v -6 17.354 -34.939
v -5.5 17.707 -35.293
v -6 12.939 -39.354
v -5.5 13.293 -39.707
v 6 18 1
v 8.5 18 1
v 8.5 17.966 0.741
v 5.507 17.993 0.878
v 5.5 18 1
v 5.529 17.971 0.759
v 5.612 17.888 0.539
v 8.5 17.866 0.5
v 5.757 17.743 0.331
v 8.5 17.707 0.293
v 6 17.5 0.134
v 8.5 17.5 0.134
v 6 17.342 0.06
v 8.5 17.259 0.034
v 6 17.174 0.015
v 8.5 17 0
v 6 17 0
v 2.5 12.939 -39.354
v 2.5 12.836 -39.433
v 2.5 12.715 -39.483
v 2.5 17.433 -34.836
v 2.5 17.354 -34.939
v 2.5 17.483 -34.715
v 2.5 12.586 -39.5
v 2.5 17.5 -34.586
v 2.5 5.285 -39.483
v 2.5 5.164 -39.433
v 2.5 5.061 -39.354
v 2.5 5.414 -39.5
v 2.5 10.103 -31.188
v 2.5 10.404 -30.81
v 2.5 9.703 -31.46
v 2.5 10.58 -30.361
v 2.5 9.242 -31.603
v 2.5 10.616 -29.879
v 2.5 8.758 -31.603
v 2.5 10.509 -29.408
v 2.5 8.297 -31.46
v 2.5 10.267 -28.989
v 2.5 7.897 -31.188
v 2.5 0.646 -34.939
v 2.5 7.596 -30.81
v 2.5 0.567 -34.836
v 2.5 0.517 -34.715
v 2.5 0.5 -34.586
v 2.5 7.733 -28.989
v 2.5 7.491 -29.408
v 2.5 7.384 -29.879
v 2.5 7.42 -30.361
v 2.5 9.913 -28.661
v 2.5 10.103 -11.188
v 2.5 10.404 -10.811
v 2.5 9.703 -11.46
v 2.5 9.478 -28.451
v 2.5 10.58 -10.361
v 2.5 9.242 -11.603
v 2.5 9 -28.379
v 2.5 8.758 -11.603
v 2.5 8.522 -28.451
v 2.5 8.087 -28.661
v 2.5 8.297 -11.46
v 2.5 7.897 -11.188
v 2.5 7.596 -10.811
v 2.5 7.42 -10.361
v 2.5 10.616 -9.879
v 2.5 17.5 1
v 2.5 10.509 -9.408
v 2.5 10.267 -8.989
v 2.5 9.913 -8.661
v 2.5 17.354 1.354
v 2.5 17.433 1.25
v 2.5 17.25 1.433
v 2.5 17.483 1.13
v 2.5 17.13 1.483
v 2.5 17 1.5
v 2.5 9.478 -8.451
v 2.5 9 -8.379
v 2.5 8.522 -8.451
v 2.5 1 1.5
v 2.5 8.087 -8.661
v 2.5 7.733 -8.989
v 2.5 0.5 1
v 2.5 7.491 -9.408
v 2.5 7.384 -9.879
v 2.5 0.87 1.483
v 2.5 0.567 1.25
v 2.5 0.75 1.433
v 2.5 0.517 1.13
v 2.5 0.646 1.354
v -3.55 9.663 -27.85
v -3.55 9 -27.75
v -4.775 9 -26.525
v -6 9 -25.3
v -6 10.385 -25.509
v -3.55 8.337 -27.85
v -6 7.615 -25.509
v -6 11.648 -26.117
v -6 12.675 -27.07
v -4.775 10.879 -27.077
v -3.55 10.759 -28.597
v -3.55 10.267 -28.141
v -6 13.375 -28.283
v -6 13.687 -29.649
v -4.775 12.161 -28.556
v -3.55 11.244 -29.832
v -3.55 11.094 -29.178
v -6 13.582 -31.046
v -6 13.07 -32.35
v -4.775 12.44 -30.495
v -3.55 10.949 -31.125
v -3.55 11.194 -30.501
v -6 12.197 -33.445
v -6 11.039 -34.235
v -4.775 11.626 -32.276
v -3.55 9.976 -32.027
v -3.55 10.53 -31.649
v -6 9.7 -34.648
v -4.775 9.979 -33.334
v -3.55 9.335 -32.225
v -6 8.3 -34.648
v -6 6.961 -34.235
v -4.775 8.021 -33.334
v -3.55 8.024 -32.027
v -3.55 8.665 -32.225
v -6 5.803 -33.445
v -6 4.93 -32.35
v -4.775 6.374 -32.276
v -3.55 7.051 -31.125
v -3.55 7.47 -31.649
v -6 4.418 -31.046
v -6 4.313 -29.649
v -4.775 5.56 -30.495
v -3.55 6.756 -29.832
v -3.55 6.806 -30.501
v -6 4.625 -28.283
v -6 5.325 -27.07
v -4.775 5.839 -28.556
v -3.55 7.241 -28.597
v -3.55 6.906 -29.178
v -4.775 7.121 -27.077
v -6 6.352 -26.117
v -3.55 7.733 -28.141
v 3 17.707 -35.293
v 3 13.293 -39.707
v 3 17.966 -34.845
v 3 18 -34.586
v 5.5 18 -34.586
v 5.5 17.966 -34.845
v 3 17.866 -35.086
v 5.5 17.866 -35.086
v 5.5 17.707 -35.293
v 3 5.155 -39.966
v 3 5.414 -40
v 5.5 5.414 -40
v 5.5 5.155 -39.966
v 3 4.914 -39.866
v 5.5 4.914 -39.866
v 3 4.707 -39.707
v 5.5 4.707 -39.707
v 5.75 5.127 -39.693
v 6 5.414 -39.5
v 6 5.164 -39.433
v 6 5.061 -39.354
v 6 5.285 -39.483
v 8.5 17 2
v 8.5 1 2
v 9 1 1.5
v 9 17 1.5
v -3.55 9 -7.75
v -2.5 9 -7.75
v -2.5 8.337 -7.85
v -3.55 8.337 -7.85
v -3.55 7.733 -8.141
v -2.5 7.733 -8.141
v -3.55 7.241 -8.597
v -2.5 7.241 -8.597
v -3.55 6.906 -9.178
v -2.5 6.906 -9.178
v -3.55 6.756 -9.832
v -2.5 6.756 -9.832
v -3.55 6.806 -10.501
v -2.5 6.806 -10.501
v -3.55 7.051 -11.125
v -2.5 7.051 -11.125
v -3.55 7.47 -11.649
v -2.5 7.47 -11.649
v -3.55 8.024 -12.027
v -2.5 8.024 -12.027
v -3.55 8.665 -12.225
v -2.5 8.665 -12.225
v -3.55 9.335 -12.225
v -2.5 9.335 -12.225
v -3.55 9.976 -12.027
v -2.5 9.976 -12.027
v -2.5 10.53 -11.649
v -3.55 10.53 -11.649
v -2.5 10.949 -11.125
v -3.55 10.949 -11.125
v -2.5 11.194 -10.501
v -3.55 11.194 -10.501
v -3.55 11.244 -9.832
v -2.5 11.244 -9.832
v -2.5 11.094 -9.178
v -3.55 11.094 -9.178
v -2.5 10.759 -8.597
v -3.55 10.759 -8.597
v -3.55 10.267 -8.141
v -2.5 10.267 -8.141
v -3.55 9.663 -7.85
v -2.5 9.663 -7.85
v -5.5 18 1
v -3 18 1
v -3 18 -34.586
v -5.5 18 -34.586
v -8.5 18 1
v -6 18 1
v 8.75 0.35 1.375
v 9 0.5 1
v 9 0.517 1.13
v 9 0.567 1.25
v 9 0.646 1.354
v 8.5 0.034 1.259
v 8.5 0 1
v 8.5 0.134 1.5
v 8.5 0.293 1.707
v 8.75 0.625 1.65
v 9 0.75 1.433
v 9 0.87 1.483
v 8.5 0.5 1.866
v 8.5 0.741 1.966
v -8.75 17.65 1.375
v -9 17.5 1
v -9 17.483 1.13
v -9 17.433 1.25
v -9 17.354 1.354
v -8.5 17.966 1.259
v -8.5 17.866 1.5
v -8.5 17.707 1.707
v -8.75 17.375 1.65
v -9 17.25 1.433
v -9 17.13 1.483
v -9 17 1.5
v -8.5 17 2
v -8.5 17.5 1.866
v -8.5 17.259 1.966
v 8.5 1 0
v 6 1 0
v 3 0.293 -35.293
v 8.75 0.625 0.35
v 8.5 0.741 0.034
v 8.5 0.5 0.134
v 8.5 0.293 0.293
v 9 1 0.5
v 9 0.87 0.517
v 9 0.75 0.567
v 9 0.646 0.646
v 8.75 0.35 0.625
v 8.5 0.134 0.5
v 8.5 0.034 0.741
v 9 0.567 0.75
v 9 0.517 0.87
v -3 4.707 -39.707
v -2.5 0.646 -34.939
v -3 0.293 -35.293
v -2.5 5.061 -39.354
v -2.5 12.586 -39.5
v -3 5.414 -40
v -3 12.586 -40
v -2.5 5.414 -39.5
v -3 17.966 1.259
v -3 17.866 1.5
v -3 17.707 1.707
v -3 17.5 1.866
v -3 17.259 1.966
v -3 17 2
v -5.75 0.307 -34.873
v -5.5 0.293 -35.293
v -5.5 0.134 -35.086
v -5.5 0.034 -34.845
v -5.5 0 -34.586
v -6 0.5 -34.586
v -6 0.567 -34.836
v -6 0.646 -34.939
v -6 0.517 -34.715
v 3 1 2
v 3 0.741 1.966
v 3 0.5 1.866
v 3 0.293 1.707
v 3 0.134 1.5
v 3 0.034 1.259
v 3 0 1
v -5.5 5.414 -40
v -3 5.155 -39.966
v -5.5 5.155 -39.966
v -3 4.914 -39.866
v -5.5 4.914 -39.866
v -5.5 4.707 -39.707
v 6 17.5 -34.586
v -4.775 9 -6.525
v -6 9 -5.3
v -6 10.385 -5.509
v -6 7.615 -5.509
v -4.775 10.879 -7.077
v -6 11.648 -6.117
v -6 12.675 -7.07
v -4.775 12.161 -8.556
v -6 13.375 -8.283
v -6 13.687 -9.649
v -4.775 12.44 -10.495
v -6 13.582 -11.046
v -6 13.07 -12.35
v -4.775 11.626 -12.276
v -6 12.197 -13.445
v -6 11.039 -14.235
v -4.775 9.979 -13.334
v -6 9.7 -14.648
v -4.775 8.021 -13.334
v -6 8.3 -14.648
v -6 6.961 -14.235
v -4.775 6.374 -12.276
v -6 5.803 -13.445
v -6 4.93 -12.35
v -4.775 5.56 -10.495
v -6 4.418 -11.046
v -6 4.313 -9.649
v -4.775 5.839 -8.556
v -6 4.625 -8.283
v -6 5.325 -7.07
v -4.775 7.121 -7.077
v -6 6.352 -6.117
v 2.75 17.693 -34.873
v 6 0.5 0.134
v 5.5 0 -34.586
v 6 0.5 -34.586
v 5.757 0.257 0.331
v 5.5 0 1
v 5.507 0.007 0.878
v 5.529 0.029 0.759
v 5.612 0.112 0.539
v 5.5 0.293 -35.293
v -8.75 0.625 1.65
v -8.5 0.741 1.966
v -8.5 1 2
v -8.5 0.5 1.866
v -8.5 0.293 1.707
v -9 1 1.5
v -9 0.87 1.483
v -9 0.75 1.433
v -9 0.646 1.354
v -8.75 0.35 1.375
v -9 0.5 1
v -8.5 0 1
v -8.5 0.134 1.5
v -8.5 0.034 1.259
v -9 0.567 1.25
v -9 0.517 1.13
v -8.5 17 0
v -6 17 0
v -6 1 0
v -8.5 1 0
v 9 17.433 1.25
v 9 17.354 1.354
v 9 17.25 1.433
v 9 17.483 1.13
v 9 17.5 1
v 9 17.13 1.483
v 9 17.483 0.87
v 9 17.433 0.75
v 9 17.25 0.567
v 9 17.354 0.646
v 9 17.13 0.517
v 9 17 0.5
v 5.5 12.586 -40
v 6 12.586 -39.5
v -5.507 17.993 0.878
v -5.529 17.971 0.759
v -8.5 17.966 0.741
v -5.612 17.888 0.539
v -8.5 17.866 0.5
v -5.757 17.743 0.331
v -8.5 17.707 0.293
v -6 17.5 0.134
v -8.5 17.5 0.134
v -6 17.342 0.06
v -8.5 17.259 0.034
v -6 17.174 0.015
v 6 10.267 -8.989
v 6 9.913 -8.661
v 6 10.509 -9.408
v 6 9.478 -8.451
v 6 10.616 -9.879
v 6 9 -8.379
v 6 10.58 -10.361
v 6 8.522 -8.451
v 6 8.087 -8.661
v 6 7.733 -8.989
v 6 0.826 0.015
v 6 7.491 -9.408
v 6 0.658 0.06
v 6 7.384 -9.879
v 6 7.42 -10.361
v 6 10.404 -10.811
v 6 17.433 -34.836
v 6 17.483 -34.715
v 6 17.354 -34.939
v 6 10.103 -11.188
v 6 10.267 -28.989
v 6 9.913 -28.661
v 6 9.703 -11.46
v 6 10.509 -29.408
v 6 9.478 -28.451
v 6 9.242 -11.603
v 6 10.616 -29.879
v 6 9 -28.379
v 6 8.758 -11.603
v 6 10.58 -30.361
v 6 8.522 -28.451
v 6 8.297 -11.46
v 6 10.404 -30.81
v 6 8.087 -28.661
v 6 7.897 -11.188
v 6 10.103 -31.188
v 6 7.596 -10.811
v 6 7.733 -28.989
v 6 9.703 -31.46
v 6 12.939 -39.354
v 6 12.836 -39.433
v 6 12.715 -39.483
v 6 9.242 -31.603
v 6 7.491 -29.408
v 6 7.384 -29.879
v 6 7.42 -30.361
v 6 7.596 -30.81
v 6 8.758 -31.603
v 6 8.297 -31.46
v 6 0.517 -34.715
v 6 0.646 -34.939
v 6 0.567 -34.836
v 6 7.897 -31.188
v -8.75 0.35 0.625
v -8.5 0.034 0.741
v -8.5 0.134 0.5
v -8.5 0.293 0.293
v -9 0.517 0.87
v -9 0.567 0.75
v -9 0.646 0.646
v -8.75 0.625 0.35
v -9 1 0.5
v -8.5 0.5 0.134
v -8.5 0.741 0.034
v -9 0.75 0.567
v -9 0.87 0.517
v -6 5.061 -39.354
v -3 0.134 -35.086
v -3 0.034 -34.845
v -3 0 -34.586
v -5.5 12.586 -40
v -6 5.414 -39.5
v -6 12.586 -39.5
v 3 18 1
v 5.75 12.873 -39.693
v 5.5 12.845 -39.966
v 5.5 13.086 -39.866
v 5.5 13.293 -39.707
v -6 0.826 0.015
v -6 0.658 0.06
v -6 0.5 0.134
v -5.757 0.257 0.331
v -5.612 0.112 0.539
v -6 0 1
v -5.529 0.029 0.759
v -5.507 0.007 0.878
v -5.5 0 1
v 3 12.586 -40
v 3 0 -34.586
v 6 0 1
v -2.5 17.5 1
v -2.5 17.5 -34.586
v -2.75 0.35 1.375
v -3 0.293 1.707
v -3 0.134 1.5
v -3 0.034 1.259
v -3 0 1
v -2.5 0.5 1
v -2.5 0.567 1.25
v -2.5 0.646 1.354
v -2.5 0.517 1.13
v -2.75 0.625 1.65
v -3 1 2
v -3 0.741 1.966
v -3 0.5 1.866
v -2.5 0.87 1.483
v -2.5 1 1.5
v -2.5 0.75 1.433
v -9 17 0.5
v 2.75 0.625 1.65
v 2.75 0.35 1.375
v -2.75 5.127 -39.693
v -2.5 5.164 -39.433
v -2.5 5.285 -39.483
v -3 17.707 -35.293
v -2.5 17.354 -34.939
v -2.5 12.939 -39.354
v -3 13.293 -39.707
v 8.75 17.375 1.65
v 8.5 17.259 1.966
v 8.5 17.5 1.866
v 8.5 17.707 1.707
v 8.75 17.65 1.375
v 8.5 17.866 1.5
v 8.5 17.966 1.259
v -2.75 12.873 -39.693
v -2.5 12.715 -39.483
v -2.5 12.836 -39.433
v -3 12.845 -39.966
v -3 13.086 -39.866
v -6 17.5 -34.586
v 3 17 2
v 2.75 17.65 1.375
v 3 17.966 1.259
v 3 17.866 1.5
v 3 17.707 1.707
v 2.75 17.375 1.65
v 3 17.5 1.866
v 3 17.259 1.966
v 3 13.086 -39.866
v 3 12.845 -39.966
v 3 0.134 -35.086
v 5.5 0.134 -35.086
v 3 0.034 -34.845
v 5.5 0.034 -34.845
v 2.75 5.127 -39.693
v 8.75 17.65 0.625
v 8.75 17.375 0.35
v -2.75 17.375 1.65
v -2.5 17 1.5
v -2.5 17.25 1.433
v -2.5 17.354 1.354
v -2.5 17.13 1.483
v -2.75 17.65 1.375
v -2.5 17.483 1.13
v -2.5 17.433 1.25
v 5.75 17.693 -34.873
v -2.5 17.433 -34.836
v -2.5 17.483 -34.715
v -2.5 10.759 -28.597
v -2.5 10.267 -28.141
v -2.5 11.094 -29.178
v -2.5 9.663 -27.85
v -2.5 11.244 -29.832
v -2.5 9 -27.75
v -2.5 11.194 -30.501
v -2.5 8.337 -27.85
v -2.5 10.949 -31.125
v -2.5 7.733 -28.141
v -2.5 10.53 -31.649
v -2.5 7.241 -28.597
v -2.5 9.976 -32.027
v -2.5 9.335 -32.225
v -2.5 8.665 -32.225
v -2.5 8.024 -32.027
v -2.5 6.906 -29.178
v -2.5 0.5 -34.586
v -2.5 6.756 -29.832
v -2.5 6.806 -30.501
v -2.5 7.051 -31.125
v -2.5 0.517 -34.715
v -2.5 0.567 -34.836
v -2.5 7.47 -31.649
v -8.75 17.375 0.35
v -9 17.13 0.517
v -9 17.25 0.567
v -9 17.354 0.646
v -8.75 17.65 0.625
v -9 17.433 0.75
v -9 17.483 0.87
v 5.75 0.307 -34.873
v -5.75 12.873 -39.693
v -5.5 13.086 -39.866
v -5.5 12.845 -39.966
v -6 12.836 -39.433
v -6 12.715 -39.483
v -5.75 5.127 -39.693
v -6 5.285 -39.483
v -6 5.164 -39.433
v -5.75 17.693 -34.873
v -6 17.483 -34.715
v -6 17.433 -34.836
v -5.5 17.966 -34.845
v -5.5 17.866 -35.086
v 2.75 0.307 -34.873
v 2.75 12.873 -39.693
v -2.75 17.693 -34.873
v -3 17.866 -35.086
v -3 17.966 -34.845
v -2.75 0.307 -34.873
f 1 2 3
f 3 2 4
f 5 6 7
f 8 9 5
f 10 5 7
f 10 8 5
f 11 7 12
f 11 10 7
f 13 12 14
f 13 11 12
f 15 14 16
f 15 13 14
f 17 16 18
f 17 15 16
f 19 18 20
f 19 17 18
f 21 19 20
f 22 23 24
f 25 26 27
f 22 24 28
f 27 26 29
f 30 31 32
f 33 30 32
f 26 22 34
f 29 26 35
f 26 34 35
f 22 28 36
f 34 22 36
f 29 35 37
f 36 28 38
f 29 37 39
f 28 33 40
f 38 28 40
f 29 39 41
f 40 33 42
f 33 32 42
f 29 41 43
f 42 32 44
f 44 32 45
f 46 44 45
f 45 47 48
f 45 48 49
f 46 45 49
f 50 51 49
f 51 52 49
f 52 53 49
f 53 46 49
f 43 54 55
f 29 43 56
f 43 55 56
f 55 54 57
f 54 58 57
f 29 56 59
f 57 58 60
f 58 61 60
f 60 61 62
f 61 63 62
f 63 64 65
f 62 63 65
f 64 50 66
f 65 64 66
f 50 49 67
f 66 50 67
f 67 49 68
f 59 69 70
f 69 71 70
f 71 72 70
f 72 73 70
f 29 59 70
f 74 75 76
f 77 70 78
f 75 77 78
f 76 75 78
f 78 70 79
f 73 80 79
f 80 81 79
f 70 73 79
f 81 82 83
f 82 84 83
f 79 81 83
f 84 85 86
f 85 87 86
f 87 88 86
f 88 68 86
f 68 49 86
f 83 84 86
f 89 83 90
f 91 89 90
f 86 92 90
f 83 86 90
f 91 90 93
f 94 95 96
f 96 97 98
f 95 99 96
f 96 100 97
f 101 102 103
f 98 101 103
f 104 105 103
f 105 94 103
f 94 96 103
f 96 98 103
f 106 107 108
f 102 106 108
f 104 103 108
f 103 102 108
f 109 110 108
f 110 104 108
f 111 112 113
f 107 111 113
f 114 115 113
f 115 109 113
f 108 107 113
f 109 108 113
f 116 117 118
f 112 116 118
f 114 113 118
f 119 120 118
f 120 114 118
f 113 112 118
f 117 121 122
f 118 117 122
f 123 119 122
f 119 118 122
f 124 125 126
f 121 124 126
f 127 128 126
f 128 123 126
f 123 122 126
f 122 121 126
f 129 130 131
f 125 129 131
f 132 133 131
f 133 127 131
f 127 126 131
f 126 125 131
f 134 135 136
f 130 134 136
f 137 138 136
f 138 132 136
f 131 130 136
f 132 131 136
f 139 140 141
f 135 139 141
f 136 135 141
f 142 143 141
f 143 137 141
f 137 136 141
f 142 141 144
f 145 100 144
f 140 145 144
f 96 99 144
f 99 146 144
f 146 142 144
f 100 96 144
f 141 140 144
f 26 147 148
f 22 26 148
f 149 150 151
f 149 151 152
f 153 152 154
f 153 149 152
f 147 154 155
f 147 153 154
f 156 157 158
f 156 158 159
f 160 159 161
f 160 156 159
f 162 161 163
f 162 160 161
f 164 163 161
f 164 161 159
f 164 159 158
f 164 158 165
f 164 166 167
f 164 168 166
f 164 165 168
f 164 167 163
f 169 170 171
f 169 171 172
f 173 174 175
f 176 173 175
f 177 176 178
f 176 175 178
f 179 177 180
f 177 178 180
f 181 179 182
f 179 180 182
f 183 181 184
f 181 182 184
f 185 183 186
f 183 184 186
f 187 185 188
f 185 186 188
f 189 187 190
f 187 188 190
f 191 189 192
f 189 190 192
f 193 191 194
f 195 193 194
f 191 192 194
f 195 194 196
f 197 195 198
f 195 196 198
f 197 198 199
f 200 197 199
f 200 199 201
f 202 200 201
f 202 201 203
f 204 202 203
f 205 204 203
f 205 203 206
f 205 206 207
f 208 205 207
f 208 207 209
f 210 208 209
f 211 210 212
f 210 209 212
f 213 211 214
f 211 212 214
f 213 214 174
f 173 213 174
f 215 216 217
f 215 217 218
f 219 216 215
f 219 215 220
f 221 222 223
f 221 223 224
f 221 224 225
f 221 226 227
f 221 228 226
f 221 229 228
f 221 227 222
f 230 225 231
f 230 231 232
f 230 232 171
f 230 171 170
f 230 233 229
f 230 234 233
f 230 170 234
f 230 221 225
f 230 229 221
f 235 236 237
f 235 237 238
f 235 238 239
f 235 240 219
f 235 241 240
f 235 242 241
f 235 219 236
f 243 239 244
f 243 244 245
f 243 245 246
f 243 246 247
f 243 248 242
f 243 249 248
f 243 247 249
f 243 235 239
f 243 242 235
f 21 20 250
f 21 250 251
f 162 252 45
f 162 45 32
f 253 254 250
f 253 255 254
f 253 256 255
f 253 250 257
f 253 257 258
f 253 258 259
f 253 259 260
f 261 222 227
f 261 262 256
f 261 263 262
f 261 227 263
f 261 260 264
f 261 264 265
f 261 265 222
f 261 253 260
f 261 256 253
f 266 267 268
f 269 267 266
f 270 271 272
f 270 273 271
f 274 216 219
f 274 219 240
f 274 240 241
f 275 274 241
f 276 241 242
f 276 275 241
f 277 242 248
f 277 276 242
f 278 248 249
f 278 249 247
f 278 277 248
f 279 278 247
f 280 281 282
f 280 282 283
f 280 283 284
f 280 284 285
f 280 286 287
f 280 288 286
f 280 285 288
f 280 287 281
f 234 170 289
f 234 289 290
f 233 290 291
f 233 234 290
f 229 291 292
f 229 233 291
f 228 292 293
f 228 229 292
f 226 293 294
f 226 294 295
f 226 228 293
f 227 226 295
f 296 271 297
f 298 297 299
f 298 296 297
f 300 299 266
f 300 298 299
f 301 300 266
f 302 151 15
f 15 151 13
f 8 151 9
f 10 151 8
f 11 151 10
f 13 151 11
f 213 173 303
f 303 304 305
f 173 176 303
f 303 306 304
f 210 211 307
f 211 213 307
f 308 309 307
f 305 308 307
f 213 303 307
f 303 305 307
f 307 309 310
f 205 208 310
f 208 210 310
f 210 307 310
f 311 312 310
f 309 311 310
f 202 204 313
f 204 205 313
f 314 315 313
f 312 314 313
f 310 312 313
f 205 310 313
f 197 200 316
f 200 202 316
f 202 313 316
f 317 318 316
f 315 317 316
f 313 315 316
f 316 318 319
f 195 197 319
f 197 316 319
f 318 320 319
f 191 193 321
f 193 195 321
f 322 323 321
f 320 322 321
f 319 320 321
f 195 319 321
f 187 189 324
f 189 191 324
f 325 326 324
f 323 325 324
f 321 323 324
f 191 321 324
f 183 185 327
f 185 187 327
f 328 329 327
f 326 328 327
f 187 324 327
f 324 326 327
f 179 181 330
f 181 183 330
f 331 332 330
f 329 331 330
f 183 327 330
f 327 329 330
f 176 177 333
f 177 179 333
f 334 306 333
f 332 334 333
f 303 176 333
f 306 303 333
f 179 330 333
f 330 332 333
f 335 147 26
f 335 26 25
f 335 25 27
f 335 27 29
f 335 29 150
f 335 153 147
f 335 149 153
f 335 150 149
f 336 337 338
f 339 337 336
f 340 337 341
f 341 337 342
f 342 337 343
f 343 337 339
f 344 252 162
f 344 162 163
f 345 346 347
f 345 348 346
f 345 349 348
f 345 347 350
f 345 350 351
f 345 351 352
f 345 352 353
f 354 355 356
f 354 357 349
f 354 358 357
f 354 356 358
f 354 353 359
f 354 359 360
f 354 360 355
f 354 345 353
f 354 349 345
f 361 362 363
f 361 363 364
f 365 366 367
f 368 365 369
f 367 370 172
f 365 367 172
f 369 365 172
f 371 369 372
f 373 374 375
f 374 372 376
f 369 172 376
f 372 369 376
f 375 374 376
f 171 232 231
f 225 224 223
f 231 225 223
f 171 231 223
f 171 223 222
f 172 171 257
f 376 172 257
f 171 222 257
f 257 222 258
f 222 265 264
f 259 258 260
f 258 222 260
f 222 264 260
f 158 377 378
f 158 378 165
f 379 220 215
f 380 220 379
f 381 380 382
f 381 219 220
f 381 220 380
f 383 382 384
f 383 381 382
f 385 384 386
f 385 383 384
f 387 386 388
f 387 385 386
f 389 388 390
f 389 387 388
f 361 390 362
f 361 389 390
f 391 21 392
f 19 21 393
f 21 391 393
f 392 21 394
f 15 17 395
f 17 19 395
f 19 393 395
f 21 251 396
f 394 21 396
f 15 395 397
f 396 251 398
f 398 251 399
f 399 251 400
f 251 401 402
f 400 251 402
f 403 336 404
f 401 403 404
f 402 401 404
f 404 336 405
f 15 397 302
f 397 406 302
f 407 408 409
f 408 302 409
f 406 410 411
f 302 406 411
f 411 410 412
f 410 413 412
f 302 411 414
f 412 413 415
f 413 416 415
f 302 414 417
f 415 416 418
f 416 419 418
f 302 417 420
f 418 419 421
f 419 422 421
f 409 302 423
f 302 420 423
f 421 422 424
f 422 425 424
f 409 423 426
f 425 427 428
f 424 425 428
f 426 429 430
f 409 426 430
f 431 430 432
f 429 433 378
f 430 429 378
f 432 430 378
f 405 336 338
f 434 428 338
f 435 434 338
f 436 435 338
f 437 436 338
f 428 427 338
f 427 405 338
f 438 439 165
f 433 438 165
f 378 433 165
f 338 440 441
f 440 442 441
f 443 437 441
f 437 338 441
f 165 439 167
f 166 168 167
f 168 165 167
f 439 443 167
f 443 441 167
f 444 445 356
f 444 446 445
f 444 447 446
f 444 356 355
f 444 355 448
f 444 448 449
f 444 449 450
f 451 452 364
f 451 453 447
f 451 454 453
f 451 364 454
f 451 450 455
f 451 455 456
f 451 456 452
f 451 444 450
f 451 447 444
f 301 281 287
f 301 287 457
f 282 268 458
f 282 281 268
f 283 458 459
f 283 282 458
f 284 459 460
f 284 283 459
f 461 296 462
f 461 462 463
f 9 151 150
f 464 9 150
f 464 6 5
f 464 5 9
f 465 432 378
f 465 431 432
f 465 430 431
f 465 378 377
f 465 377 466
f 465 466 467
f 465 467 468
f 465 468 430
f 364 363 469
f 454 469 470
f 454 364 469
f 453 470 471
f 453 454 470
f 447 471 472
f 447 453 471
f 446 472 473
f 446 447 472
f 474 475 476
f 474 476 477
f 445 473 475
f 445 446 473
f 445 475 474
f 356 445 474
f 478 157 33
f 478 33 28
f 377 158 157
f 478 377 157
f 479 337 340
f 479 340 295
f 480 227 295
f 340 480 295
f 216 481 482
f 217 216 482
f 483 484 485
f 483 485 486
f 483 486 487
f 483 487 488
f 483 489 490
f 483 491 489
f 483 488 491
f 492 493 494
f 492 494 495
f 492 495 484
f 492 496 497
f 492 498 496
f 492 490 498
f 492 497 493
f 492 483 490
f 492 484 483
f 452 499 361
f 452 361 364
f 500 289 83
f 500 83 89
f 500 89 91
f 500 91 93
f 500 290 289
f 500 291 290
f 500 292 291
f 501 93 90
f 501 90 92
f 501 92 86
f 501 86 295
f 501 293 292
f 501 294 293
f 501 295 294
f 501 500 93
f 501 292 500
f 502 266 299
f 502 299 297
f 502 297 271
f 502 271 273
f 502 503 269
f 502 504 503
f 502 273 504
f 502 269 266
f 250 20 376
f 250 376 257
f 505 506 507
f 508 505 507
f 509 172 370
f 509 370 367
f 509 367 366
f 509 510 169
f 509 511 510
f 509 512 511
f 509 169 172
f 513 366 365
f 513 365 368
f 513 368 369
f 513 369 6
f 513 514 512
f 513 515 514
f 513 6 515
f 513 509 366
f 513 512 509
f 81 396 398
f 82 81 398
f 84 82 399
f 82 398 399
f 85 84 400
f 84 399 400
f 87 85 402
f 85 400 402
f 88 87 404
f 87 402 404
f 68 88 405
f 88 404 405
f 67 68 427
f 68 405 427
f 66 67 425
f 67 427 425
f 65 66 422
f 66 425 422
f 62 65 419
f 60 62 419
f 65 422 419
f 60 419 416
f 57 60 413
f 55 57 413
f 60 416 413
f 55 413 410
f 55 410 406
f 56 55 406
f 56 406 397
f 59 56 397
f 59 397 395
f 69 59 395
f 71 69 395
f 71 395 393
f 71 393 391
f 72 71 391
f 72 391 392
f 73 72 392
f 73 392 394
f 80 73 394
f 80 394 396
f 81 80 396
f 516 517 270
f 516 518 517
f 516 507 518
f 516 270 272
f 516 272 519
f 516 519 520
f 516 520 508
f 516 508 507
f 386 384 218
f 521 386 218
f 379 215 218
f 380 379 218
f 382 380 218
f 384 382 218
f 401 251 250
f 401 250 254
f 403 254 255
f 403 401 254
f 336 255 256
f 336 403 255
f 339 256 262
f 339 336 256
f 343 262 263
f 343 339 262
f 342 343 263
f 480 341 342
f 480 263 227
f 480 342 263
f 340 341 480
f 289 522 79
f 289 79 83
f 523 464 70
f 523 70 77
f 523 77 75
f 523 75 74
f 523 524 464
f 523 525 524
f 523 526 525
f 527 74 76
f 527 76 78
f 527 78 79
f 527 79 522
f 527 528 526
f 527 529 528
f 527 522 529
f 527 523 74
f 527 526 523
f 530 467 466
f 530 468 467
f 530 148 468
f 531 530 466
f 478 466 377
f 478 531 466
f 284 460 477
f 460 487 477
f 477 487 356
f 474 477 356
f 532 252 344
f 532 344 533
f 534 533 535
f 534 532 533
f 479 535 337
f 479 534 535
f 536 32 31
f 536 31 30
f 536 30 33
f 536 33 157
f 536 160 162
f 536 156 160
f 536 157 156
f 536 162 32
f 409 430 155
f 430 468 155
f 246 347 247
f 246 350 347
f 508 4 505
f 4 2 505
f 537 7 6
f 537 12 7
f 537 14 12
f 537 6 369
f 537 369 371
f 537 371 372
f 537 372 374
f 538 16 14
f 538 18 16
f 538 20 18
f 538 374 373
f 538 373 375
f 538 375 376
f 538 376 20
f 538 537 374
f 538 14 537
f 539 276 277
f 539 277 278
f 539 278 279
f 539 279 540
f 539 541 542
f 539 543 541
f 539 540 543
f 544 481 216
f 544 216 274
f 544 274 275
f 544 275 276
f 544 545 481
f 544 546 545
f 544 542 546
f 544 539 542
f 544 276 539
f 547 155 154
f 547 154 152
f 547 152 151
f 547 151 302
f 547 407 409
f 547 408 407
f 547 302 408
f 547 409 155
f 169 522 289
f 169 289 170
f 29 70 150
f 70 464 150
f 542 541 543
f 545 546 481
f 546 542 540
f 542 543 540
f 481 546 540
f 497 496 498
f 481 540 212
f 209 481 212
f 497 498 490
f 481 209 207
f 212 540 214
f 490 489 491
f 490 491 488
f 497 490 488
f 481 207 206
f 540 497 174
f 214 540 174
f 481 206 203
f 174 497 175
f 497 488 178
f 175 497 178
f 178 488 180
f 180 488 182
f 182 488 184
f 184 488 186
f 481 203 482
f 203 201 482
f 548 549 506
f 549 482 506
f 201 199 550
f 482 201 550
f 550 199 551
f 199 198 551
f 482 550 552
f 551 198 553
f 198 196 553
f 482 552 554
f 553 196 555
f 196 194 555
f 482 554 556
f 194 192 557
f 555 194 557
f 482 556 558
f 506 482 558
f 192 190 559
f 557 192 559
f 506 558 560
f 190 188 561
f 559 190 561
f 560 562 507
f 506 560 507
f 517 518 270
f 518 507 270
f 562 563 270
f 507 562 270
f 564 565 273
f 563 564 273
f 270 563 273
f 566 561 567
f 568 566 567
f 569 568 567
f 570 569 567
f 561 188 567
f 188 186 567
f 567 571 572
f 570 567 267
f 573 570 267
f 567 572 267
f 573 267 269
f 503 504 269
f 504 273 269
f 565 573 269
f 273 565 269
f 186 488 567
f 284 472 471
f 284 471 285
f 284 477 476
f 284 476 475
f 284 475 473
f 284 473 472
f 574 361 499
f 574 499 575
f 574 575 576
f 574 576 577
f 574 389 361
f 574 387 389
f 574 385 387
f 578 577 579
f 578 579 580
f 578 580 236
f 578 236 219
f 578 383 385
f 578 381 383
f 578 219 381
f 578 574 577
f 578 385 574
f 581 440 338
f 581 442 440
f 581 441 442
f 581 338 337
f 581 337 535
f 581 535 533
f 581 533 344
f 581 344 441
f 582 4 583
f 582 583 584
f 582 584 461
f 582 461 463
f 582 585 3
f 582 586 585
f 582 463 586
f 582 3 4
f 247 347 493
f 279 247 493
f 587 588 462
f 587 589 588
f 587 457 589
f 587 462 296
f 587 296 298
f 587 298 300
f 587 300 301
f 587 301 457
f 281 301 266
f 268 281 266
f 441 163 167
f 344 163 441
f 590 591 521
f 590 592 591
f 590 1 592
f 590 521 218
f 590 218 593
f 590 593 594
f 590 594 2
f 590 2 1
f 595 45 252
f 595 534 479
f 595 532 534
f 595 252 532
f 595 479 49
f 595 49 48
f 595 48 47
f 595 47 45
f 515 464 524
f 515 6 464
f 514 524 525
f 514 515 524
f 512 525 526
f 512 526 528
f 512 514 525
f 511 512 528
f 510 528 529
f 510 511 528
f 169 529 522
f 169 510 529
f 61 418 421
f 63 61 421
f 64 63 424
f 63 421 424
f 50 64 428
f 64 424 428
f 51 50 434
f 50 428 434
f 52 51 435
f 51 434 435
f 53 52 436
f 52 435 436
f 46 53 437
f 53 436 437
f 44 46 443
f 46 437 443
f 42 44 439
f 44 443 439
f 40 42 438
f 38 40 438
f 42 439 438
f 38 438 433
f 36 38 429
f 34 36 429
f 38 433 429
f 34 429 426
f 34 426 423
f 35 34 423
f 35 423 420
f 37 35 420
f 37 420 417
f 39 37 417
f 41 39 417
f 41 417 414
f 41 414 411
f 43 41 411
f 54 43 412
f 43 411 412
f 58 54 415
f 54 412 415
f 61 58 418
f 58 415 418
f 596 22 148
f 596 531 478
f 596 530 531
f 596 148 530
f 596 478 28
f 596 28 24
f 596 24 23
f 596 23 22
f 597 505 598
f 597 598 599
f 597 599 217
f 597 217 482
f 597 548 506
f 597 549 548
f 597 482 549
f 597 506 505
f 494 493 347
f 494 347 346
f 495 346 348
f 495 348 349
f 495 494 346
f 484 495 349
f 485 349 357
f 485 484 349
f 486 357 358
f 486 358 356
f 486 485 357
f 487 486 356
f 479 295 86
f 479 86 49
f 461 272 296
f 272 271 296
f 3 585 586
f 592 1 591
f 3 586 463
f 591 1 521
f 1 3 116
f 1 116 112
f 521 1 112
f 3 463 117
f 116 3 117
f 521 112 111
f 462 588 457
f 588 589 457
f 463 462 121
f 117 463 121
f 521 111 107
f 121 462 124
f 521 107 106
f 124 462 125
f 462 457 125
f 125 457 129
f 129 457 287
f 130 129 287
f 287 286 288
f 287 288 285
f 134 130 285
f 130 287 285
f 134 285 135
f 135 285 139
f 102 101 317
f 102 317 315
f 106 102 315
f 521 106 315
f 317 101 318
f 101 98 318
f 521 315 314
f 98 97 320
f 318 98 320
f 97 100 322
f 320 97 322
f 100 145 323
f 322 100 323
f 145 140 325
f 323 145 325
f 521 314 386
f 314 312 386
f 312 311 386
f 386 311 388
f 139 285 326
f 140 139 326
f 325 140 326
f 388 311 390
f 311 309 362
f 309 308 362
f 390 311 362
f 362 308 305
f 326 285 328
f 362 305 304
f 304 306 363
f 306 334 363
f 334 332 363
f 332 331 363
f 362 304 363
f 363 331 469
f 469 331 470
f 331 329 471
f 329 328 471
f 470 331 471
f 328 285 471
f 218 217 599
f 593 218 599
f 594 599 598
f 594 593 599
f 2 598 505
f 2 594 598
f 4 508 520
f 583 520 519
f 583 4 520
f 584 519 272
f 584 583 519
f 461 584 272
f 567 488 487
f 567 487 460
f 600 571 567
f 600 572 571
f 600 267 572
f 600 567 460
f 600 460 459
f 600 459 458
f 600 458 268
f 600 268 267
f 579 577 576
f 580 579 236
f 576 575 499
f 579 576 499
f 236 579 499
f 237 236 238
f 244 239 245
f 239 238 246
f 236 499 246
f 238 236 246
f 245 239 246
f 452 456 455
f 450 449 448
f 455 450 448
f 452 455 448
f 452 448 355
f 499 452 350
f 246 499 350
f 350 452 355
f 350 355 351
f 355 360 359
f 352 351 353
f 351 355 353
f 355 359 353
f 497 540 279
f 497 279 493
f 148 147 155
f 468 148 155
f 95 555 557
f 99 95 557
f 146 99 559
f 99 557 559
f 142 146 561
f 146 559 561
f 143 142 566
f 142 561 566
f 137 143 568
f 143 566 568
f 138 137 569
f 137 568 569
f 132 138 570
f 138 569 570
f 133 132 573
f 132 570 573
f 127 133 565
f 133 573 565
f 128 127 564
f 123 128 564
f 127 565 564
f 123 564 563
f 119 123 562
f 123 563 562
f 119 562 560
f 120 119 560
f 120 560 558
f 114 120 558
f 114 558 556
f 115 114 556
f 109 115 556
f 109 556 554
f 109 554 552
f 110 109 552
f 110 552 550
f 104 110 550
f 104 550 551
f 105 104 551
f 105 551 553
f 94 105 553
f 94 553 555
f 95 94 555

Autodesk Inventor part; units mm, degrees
ref_plane "YZ Plane" through (0, 0, 0) normal (1, 0, 0) x (0, 1, 0)
ref_plane "XZ Plane" through (0, 0, 0) normal (0, 1, 0) x (-1, 0, 0)
ref_plane "XY Plane" through (0, 0, 0) normal (0, 0, 1) x (1, 0, 0)
sketch "Skizze1" plane through (0, 0, 0) normal (0, 1, 0) x (-1, 0, 0)
  line L0 (9, 2) -> (-9, 2)
  line L1 (-9, 2) -> (-9, 0)
  line L2 (-9, 0) -> (-6, 0)
  line L3 (-6, 0) -> (-6, -40)
  line L4 (-6, -40) -> (-2.5, -40)
  line L5 (-2.5, -40) -> (-2.5, 0)
  line L6 (-2.5, 0) -> (2.5, 0)
  line L7 (2.5, 0) -> (2.5, -40)
  line L8 (2.5, -40) -> (6, -40)
  line L9 (6, -40) -> (6, 0)
  line L10 (6, 0) -> (9, 0)
  line L11 (9, 0) -> (9, 2)
  point P0 (0, 0)
  point P1 (0, 0)
  dimension "d0" = 3
  dimension "d1" = 5
  dimension "d2" = 2
  dimension "d3" = 3.5
  dimension "d4" = 40
extrude "Extrusion1" add sketch "Skizze1" along normal blind 18
chamfer "Fasen3" distance 5 angle 45 4 edges at (-4.25, 18, -40) (4.25, 18, -40) (4.25, 0, -40) (-4.25, 0, -40)
fillet "Rundung3" radius 1 16 edges at (-4.25, 18, -35) (-4.25, 13, -40) (-4.25, 5, -40) (-4.25, 0, -35) (4.25, 0, -35) (4.25, 5, -40) (4.25, 13, -40) (4.25, 18, -35) (0, 18, 0) (7.5, 18, 0) (0, 18, 2) (-7.5, 18, 0) (-7.5, 0, 0) (0, 0, 2) (0, 0, 0) (7.5, 0, 0)
sketch "Skizze3" plane through (-6, 0, -34.5858) normal (-1, 0, 0) x (0, 0, 1)
  line L0 (34.5858, 1) -> (34.5858, 17) projected
  point P0 (34.5858, 0)
  point P1 (24.5858, 9)
  point P2 (4.5858, 9)
  point P3 (34.5858, 9)
  dimension "d28" = 10
  dimension "d29" = 20
hole "Bohrung2" at (-6, 9, -10) at (-6, 9, -30) direction (1, 0, 0) diameter 3.242 end through all thread size "M4x0.7" class "6H" standard "ISO Metric profile"
hole "Bohrung3" at (-6, 9, -10) at (-6, 9, -30) direction (1, 0, 0) diameter 4.5 depth 3.5 countersink diameter 9.4 countersink angle 90 clearance for "Flachkopfsenkschraube DIN EN ISO 2009" size "M4" standard "DIN"
sketch "Skizze4" plane through (-2.5, 1, 0) normal (1, 0, 0) x (0, 0, -1)
  line L0 (46.0679, 28.7323) -> (-6.5362, 28.7323)
  line L1 (-6.5362, 28.7323) -> (-6.5362, -10.7207)
  line L2 (-6.5362, -10.7207) -> (46.0679, -10.7207)
  line L3 (46.0679, -10.7207) -> (46.0679, 28.7323)
  point P0 (0, -1)
extrude "Extrusion2" cut sketch "Skizze4" along normal up to surface (5 mm away)
chamfer "Fasen4" distance 0.5 angle 45 41 edges at (-2.5, 9, -40) (-2.5, 12.9685, -39.9239) (-2.5, 15.5, -37.5) (-2.5, 17.9239, -34.9685) (-2.5, 18, -16.7927) (-2.5, 0, -16.7927) (-2.5, 0.0761, -34.9685) (-2.5, 2.5, -37.5) (-2.5, 5.0315, -39.9239) (2.5, 5.0315, -39.9239) (2.5, 9, -40) (2.5, 12.9685, -39.9239) (2.5, 15.5, -37.5) (2.5, 17.9239, -34.9685) (2.5, 18, -16.7927) (2.5, 0, -16.7927) (2.5, 0.0761, -34.9685) (2.5, 2.5, -37.5) (6, 5.0315, -39.9239) (6, 2.5, -37.5) (6, 0.0761, -34.9685) (6, 0, -16.7932) (6, 9, -40) (6, 12.9685, -39.9239) (6, 15.5, -37.5) (6, 17.9239, -34.9685) (6, 18, -16.7932) (-6, 2.5, -37.5) (-6, 5.0315, -39.9239) (-6, 9, -40) (-6, 12.9685, -39.9239) (-6, 15.5, -37.5) (-6, 17.9239, -34.9685) (-6, 18, -16.7932) (-6, 0.0761, -34.9685) (-6, 0, -16.7932) (9, 9, 2) (9, 9, 0) (-9, 0.2927, 0.2927) (-9, 9, 0) (-9, 9, 2)
equation "\"d_tol\" = 0.3"
equation "\"d_wand\" = 1.5"
equation "\"b_rasp_pi\" = 56"
equation "\"w_kamera_hori\" = 66deg"
equation "\"l_rasp_pi\" = 85"
equation "\"w_kamera_vert\" = 41deg"
equation "\"r_rasp_pi\" = 3"
equation "\"D_oct\" = 3621.32034"
equation "\"D_hexadeca\" = 7541.00924"
equation "\"d_traeger\" = 625"
properties part number "Fuß"
